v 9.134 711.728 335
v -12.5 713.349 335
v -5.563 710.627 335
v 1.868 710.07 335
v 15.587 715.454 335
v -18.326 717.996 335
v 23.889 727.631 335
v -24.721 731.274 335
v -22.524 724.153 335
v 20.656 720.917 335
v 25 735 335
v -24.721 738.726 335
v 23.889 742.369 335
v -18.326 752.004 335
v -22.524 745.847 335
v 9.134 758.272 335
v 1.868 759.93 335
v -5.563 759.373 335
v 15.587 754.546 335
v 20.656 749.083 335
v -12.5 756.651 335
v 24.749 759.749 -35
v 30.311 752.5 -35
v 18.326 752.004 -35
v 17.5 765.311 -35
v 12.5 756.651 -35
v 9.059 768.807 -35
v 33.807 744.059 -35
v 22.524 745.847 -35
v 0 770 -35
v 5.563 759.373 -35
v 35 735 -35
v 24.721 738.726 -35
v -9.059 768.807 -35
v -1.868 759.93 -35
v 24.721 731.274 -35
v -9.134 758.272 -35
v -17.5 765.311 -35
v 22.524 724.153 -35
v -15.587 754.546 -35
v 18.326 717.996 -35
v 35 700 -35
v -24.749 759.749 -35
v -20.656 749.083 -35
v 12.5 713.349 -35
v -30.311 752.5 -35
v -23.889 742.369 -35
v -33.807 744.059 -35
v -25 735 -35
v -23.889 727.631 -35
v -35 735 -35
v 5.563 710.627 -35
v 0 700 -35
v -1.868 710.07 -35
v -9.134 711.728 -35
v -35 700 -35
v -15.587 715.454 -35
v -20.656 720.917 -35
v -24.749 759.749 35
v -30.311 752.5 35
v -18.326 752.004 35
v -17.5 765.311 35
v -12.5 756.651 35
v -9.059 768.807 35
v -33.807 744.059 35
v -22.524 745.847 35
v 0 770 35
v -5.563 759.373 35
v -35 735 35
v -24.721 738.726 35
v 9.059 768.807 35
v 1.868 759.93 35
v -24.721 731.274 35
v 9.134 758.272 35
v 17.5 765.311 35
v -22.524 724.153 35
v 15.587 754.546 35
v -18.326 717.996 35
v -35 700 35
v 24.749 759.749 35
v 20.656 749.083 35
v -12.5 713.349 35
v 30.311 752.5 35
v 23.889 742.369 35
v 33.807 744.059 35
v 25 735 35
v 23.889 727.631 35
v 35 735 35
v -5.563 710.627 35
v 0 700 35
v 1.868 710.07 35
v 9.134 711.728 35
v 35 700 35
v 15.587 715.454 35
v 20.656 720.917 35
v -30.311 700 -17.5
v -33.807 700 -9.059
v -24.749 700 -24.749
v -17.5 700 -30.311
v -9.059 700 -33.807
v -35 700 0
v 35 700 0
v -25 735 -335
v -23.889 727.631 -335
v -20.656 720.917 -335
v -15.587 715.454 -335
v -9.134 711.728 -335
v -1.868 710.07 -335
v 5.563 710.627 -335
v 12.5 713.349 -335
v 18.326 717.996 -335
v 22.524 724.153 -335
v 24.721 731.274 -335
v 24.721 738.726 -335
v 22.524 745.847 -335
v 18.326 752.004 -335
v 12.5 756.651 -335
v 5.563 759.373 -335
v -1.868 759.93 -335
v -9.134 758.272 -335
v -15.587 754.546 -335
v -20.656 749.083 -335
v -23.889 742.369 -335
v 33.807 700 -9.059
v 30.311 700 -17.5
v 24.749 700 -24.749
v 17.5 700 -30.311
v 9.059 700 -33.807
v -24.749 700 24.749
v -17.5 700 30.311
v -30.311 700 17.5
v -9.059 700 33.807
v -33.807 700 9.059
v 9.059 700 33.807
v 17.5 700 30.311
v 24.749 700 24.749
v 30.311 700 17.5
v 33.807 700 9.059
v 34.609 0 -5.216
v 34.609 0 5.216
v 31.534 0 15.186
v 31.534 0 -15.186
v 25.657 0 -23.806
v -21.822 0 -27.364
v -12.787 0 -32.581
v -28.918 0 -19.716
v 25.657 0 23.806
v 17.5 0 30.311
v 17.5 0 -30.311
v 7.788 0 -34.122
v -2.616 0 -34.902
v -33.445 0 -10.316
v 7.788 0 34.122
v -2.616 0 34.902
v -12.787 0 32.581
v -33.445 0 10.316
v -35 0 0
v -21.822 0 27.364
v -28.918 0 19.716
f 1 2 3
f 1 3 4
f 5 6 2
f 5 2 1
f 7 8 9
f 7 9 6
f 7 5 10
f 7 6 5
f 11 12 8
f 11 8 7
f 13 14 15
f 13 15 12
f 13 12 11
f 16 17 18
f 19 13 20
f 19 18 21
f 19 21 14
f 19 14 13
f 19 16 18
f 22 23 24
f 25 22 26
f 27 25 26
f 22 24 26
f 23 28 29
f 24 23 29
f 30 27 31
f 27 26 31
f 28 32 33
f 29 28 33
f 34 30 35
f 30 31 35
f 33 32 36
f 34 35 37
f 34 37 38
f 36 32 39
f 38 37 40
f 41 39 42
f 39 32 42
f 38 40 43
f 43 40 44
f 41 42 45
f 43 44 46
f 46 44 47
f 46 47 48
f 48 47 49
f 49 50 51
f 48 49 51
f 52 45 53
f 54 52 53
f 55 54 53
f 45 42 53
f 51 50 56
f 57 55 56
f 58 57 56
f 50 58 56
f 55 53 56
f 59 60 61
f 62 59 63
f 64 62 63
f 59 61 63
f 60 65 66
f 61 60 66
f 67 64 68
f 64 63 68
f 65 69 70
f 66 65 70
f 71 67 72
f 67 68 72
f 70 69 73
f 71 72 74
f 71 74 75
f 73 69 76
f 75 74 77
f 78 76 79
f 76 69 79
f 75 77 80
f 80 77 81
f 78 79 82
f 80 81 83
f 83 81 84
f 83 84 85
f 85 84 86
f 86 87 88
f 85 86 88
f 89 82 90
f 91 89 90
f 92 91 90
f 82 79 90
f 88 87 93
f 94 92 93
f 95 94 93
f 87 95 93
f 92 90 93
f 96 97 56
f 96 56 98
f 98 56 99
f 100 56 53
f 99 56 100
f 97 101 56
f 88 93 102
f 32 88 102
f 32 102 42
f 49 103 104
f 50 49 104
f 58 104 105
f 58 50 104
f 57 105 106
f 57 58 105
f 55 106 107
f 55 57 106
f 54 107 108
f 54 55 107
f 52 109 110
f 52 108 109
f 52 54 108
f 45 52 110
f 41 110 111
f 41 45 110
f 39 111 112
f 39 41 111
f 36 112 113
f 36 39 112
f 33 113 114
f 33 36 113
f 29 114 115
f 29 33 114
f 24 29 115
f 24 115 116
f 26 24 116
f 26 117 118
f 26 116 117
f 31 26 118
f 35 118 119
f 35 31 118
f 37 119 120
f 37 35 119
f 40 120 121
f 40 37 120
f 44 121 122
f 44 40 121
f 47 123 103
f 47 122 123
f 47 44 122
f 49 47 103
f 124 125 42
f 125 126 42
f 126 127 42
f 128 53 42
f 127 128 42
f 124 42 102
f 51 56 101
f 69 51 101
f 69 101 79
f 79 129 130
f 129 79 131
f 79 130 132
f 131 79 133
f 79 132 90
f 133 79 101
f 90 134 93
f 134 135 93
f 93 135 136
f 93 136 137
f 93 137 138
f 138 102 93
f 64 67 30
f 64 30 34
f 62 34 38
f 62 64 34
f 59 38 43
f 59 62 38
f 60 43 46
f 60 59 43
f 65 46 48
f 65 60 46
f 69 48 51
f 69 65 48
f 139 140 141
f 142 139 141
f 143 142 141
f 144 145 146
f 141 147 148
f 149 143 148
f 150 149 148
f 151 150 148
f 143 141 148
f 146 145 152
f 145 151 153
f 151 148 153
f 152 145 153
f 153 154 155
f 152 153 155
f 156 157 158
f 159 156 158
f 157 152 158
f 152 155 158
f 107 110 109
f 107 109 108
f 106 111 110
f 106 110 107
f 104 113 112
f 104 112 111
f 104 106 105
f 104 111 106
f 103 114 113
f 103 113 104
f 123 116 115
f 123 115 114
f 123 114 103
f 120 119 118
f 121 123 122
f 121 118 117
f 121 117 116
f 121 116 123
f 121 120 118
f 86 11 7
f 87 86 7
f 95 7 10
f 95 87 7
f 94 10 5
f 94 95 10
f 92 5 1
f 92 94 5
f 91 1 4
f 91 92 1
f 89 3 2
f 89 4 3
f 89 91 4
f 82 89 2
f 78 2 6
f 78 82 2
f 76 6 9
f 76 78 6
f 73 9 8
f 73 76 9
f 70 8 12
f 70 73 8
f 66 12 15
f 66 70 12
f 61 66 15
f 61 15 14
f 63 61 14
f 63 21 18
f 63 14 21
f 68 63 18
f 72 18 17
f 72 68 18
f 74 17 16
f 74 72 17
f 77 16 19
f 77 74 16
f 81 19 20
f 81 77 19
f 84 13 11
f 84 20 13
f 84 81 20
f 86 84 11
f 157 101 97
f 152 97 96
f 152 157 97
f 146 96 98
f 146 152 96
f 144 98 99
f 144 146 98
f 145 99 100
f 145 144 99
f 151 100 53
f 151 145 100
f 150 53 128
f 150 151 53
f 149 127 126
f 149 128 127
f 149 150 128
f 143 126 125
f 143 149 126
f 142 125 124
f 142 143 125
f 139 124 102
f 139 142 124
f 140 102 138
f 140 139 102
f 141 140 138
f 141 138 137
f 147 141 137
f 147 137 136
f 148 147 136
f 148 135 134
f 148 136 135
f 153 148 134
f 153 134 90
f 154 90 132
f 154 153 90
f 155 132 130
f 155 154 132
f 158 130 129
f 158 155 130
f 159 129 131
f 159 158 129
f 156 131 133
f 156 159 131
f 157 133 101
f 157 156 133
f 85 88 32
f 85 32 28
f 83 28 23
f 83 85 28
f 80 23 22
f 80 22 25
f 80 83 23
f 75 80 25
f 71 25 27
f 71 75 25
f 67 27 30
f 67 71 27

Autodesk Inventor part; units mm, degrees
ref_plane "YZ Plane" through (0, 0, 0) normal (1, 0, 0) x (0, 1, 0)
ref_plane "XZ Plane" through (0, 0, 0) normal (0, 1, 0) x (-1, 0, 0)
ref_plane "XY Plane" through (0, 0, 0) normal (0, 0, 1) x (1, 0, 0)
sketch "Sketch1" plane through (0, 0, 0) normal (0, 1, 0) x (-1, 0, 0)
  circle A0 centre (0, 0) radius 35
  dimension "d0" = 70
extrude "Extrusion1" add sketch "Sketch1" along normal blind 700
sketch "Sketch2" plane through (0, 700, 0) normal (0, 1, 0) x (1, 0, 0)
  line L0 (0, 0) -> (0, -35)
  line L1 (0, -35) -> (35, -35)
  line L2 (35, -35) -> (35, 35)
  line L3 (35, 35) -> (-35, 35)
  line L4 (-35, 35) -> (-35, -35)
  circle A0 centre (0, 0) radius 35 projected
  line L5 (-35, -35) -> (0, -35)
  dimension "d3" = 35
  dimension "d4" = 35
  dimension "d5" = 70
  dimension "d6" = 70
  dimension "d7" = 70
extrude "Extrusion2" add sketch "Sketch2" along normal blind 70
sketch "Sketch3" plane through (-35, 700, 35) normal (0, 0, 1) x (1, 0, 0)
  circle A0 centre (35, 35) radius 25
  point P0 (35, -700)
  dimension "d10" = 50
extrude "Extrusion3" add sketch "Sketch3" along normal blind 300
sketch "Sketch4" plane through (35, 700, -35) normal (0, 0, -1) x (-1, 0, 0)
  line L0 (70, 70) -> (70, 35)
  line L1 (70, 0) -> (70, 70) projected
  line L2 (70, 35) -> (35, 35)
  circle A0 centre (35, 35) radius 25
  point P0 (35, -700)
  dimension "d13" = 35
  dimension "d14" = 35
  dimension "d15" = 50
extrude "Extrusion4" add sketch "Sketch4" along normal blind 300
fillet "Fillet1" radius 35 2 edges at (35, 770, 0) (-35, 770, 0)
thread "Thread1" size "M70x6" class "6g" standard "ANSI Metric M Profile" length 600 offset 50
properties part number "fuso"
